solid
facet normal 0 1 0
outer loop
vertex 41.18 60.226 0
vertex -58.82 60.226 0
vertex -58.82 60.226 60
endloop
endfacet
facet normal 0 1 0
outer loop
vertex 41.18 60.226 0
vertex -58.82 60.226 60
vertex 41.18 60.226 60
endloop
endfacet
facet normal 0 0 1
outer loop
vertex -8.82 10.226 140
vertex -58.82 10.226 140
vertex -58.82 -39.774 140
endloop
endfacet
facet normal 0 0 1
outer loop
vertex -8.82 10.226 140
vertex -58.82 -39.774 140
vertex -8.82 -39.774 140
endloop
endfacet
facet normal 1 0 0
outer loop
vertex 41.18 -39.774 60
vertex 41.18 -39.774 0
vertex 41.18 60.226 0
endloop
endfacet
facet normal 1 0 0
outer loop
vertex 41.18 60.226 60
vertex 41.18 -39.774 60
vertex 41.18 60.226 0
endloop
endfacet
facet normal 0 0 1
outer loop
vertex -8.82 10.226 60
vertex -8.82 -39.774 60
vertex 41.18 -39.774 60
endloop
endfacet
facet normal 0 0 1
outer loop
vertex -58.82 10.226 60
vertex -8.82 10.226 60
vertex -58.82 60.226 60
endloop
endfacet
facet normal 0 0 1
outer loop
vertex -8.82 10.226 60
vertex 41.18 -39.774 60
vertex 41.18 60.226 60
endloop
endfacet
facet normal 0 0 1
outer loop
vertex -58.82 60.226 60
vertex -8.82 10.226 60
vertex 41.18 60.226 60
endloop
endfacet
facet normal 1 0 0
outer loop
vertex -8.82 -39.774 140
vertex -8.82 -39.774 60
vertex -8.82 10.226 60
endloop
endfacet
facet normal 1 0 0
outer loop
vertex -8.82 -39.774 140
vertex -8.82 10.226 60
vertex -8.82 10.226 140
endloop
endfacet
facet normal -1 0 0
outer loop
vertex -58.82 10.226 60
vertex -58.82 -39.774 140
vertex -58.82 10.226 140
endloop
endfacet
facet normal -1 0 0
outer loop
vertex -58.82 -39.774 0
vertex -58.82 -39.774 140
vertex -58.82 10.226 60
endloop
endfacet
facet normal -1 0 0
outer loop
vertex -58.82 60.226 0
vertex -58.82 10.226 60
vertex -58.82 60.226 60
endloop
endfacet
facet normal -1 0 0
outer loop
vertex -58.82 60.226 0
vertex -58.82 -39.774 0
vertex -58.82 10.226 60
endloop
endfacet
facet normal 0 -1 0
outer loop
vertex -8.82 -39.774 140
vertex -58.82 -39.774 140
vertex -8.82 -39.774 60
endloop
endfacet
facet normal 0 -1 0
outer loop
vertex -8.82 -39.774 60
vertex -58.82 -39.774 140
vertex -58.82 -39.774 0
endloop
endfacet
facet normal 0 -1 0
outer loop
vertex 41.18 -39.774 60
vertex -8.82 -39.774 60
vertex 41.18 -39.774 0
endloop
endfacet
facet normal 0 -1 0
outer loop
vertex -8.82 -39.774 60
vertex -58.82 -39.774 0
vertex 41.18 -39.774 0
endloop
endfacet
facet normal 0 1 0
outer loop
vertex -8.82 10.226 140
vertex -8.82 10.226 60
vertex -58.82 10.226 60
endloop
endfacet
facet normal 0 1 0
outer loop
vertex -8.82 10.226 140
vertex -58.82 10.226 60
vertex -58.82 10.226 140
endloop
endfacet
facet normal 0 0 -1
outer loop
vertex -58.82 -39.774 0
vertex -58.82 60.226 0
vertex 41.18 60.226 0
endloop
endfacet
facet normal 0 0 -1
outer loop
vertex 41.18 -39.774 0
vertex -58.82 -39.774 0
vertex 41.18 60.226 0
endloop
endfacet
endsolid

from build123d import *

# Parameters (mm, degrees)
F0_W     = 100
F0_H     = 100
F1_DEPTH = 140
F2_W     = 50
F2_H     = 80
F3_DEPTH = 100
F4_W     = 50
F4_H     = 80
F5_DEPTH = 50


with BuildPart() as f1:
    # F0 (on Top) → F1 (new body)
    with BuildSketch(Plane.XY):
        with Locations((-8.820043, 10.226071)):
            Rectangle(F0_W, F0_H)
    extrude(amount=F1_DEPTH)

    # F2 (on face) → F3 (cut, through all)
    with BuildSketch(Plane.XZ.offset(39.773929)):
        with Locations((16.179957, 100)):
            Rectangle(F2_W, F2_H)
    extrude(amount=-F3_DEPTH, mode=Mode.SUBTRACT)

    # F4 (on face) → F5 (cut, through all)
    with BuildSketch(Plane.YZ.offset(-8.820043)):
        with Locations((35.226071, 100)):
            Rectangle(F4_W, F4_H)
    extrude(amount=-F5_DEPTH, mode=Mode.SUBTRACT)


solid = f1.part
